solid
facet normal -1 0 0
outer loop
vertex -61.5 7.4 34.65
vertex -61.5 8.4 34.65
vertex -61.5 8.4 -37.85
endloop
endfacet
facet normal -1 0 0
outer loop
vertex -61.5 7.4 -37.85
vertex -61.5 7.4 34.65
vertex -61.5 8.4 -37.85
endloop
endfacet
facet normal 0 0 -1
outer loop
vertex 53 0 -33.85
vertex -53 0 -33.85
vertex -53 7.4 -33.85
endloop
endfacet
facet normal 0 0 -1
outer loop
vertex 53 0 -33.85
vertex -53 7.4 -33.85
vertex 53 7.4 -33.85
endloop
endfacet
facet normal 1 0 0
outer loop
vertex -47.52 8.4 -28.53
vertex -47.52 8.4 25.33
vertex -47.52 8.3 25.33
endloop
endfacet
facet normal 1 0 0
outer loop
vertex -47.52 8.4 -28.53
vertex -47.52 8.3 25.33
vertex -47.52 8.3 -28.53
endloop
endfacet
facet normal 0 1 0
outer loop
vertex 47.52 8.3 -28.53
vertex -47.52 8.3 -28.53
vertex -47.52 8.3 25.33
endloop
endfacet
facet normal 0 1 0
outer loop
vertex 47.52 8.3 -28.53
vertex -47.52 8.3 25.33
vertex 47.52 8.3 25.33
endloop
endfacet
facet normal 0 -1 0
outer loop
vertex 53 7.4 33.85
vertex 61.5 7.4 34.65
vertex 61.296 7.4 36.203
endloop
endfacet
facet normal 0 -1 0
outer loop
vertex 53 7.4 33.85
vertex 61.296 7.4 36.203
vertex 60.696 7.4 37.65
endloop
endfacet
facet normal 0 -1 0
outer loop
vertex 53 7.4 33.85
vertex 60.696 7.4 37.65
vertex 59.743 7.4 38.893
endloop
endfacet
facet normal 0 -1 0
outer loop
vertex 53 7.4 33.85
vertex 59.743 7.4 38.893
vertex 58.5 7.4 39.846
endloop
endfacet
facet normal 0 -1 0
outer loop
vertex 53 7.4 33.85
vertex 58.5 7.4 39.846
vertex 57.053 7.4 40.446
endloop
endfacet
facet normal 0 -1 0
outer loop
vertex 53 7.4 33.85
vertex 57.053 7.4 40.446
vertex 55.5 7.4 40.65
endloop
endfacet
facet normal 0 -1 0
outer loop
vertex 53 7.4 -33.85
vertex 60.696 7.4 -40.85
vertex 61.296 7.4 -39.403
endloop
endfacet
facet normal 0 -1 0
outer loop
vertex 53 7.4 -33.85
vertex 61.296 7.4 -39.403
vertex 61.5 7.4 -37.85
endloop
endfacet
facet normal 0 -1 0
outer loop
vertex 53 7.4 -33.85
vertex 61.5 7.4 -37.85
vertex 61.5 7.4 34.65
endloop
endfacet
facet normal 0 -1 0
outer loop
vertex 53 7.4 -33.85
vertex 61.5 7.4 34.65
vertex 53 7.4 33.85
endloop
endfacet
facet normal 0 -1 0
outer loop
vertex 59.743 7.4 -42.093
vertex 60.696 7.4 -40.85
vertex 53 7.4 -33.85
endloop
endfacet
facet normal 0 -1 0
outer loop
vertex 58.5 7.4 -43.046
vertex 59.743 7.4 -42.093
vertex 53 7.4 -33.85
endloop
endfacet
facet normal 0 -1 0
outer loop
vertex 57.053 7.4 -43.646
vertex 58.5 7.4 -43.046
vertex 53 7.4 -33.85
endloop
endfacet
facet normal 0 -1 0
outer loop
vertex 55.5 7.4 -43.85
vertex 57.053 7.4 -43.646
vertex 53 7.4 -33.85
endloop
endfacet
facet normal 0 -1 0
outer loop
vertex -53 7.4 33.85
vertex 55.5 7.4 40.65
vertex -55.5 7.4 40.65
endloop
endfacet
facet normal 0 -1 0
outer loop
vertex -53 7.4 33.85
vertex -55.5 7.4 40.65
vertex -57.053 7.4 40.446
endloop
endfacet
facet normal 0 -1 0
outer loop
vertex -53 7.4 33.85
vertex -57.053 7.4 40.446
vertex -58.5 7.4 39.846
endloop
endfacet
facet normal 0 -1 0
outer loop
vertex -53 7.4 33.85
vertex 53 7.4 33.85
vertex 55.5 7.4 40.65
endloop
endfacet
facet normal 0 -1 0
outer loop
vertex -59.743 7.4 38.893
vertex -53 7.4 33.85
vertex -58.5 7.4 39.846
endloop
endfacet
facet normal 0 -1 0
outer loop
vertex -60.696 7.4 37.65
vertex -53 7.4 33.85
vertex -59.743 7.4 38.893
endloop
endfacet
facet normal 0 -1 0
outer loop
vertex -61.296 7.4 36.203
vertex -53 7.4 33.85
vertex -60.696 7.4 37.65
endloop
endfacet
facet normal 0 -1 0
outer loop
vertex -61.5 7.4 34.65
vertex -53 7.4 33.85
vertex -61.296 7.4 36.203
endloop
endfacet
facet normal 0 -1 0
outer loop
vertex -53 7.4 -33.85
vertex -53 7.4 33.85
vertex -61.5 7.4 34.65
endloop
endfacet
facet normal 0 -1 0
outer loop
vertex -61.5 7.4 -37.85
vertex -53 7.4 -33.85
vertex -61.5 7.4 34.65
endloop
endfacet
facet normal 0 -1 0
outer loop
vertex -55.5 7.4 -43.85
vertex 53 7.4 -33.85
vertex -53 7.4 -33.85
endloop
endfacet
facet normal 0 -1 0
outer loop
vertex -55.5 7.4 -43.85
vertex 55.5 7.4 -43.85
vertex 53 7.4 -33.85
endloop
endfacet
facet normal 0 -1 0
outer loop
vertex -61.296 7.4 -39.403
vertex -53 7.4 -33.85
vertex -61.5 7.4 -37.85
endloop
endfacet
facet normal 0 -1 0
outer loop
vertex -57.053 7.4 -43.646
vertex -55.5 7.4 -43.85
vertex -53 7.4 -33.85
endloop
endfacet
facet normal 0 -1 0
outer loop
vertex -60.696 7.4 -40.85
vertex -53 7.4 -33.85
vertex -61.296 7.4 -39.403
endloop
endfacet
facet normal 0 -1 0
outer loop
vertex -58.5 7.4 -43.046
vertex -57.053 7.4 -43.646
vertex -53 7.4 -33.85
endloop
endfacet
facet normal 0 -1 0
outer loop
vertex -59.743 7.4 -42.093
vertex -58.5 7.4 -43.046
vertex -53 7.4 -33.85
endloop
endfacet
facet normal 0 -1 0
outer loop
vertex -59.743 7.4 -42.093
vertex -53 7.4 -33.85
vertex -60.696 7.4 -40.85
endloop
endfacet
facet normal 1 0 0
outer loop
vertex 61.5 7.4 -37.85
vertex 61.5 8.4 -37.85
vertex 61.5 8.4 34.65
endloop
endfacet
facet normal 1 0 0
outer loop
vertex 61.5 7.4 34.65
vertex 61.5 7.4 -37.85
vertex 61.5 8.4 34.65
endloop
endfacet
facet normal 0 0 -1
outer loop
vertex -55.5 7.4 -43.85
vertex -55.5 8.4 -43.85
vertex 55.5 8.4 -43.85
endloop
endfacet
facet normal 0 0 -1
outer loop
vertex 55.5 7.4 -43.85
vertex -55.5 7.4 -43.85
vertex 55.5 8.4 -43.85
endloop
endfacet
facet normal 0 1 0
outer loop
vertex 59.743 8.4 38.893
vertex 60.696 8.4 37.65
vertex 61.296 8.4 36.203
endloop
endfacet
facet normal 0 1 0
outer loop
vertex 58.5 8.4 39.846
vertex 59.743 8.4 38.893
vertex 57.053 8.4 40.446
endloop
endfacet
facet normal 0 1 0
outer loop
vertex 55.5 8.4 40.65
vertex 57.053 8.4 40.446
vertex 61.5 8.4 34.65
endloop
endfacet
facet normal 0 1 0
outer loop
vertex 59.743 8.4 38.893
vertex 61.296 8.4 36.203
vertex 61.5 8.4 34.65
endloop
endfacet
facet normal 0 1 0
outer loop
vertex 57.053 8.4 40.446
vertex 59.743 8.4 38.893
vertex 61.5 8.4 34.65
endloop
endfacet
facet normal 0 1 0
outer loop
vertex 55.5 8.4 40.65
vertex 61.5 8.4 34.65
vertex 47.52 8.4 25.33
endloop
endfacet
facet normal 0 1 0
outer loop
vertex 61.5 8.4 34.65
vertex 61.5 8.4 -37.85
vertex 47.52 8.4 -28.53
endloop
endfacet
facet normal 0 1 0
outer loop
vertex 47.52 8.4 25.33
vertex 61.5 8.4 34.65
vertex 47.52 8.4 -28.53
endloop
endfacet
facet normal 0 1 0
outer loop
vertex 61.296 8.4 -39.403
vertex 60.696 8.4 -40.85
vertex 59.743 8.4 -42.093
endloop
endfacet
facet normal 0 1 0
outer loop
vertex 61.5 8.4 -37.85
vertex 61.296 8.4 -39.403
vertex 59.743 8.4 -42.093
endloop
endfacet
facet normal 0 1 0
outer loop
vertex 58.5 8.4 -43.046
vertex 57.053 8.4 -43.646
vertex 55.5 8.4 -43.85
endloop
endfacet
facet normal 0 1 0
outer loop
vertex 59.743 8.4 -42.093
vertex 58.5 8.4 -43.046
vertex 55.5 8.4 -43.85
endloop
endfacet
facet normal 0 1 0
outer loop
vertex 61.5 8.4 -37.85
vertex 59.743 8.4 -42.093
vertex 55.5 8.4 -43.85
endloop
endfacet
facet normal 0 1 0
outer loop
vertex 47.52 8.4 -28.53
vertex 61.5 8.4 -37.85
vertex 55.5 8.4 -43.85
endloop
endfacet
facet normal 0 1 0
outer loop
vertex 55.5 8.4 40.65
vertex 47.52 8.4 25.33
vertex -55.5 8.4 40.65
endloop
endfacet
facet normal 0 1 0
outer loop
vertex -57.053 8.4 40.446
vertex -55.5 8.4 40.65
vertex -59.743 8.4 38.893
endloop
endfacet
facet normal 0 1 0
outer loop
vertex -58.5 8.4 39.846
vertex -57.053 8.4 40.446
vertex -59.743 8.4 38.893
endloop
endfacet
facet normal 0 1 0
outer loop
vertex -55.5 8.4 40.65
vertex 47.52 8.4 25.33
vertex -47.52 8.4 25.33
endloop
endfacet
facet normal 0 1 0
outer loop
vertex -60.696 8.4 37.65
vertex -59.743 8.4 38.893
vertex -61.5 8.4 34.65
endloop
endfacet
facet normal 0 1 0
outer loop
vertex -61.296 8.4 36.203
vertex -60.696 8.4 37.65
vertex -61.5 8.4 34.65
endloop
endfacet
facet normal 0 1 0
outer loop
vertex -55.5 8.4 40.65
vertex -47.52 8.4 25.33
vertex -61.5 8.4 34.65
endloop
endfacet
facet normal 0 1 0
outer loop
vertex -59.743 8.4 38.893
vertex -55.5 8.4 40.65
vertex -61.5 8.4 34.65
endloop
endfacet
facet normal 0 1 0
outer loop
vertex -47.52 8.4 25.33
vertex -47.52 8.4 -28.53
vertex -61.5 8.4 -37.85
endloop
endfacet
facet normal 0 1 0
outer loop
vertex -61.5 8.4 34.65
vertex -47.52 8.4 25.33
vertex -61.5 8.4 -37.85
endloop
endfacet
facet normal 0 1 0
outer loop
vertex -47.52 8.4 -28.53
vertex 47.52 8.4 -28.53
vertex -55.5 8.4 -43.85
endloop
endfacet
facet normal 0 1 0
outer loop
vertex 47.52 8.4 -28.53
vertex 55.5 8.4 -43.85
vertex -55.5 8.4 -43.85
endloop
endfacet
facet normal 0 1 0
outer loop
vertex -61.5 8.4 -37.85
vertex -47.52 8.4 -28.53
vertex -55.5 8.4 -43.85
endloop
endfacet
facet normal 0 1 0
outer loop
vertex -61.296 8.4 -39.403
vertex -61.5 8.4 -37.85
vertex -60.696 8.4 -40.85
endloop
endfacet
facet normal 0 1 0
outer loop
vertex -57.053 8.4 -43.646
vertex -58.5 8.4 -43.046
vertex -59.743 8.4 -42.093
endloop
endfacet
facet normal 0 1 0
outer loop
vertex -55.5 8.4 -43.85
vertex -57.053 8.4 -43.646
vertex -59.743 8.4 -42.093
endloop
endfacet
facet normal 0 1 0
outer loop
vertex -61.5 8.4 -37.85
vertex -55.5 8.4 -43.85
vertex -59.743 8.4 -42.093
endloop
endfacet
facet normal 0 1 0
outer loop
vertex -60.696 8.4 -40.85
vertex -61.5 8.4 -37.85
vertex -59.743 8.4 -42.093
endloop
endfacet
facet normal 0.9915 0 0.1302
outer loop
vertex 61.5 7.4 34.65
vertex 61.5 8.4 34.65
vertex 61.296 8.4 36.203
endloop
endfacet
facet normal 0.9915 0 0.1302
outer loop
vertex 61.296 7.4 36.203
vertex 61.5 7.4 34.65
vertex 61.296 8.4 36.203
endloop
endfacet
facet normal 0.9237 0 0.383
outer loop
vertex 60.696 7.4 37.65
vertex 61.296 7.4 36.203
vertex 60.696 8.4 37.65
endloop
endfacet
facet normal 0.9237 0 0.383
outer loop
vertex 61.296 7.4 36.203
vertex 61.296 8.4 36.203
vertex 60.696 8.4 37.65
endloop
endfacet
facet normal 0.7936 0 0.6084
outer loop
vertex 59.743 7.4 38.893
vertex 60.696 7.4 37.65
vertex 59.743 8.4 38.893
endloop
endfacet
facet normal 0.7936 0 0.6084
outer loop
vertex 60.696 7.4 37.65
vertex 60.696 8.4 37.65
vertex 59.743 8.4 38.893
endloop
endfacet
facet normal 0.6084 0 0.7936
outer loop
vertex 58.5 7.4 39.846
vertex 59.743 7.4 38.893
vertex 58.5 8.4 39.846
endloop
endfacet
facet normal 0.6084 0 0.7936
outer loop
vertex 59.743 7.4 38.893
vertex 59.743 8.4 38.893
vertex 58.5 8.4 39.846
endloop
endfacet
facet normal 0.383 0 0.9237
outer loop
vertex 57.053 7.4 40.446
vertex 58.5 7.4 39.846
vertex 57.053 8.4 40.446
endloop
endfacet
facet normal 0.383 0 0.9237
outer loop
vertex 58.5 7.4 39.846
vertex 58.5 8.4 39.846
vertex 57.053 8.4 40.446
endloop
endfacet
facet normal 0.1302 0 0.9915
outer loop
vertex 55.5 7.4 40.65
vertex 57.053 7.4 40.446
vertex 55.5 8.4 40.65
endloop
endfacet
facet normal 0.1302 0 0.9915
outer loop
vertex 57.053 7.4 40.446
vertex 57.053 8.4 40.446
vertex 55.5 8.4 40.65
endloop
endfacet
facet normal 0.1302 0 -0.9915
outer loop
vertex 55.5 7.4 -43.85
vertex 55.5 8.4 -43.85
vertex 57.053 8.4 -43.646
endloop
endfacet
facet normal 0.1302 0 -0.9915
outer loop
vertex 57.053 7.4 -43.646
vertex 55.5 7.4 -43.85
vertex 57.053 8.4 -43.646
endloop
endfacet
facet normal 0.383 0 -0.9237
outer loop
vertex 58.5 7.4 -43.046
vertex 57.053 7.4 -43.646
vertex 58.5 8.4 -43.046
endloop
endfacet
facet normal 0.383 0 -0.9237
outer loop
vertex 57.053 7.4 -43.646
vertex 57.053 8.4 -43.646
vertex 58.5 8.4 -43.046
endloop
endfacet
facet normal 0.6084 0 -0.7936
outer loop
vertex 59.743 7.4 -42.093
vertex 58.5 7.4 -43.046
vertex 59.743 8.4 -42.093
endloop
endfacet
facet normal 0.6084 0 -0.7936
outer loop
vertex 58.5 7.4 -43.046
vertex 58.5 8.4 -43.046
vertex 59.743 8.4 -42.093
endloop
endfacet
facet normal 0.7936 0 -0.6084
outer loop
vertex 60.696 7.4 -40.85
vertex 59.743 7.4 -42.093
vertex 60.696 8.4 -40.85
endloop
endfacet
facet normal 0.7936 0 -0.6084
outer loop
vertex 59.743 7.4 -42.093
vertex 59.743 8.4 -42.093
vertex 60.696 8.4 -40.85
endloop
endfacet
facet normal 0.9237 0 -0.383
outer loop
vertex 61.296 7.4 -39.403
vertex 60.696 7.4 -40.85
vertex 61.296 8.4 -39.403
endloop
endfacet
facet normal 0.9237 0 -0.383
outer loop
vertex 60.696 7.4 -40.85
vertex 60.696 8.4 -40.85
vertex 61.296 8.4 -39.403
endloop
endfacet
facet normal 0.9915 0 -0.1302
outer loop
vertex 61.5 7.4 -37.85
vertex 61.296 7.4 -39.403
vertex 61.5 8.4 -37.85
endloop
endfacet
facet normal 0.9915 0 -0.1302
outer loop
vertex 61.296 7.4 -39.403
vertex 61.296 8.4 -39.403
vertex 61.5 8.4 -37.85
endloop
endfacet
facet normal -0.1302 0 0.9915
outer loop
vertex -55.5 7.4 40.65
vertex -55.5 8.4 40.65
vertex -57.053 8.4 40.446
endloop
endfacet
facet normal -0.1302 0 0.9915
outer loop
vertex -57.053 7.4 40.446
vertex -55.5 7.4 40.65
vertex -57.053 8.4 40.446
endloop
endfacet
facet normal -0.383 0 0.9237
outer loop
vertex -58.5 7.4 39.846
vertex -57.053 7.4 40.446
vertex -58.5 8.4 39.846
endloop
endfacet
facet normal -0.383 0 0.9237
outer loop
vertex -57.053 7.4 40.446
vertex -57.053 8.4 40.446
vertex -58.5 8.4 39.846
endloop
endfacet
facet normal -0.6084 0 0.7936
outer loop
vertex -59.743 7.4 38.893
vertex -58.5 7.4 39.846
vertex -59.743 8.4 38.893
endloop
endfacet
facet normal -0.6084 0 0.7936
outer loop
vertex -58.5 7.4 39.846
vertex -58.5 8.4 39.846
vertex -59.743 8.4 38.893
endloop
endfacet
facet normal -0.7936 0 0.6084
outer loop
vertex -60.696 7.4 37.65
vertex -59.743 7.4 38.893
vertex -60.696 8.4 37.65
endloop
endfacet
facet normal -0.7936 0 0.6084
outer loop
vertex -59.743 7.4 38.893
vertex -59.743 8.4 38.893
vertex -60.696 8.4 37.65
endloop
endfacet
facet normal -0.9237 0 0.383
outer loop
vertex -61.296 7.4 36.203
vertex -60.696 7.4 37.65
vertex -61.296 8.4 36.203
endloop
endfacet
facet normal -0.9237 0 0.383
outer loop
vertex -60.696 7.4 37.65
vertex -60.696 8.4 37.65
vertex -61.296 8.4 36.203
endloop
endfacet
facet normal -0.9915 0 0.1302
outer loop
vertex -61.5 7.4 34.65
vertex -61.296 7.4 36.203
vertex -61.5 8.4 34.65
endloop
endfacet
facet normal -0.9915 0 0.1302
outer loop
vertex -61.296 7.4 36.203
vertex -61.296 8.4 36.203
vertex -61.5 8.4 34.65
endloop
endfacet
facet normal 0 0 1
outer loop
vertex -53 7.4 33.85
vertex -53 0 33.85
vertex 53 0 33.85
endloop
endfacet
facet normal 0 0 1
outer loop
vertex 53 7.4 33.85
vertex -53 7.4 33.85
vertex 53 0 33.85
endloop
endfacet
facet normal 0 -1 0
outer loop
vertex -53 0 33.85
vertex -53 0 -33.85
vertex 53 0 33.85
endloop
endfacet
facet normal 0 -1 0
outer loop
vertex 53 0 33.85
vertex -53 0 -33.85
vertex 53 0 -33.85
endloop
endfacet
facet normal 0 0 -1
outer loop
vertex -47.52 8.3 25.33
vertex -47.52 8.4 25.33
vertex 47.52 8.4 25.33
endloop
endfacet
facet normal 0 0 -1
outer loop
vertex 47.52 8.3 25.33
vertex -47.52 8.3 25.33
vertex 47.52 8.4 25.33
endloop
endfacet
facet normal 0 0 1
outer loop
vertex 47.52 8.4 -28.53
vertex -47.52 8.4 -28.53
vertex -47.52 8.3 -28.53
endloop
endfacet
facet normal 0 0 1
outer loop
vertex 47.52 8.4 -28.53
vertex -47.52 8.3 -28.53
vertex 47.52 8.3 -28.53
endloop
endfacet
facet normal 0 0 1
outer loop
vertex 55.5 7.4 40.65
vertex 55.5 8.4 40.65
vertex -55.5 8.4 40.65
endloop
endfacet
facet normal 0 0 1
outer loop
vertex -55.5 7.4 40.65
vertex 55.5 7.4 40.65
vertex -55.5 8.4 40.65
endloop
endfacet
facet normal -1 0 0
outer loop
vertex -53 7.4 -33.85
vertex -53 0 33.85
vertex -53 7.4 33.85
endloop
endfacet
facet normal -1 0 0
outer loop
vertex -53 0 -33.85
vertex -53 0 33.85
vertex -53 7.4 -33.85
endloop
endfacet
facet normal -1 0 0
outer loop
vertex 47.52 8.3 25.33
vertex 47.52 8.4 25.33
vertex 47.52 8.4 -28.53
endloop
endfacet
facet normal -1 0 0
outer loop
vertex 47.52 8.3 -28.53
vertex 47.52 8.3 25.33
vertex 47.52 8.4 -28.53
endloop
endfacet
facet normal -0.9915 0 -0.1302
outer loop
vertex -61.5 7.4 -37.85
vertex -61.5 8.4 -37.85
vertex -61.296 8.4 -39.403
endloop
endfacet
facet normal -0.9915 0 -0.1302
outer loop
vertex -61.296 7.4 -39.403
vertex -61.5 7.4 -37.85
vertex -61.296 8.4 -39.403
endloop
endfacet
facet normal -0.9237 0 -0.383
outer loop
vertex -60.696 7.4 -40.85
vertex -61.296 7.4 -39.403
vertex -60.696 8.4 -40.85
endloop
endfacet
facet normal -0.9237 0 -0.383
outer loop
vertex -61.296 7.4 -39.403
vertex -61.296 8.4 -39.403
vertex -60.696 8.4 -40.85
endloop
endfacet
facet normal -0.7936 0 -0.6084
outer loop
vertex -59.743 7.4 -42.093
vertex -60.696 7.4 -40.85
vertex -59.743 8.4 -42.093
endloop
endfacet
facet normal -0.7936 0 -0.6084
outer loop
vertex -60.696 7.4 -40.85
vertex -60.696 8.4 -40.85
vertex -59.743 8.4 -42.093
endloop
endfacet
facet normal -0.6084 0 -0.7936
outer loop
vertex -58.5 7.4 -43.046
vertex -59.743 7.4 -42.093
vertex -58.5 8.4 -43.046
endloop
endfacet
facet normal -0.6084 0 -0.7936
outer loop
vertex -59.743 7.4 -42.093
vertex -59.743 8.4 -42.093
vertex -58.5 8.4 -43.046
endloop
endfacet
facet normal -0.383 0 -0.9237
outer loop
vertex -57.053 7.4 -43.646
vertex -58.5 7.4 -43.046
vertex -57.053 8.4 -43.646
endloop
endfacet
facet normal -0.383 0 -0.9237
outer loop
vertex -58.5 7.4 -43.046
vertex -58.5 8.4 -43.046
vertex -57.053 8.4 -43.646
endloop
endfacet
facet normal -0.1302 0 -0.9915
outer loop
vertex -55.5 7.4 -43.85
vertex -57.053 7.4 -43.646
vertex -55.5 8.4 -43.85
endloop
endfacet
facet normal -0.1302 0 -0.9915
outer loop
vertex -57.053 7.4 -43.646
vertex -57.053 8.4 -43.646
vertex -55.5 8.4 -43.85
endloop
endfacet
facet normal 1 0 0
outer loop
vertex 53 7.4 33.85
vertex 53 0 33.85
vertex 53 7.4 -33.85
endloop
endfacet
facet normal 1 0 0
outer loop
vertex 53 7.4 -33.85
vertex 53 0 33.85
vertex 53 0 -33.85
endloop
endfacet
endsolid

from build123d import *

# Parameters (mm, degrees)
SKETCH2_W           = 106
SKETCH2_H           = 67.7
BOSS_EXTRUDE1_DEPTH = 8.4
BOSS_EXTRUDE2_DEPTH = 1
SKETCH5_W           = 95.04
SKETCH5_H           = 53.86
CUT_EXTRUDE1_DEPTH  = 0.1


with BuildPart() as part:
    # Sketch2 → Boss-Extrude1 (new body)
    with BuildSketch(Plane(origin=(0, 0, 0), x_dir=(1, 0, 0), z_dir=(0, 1, 0))):
        Rectangle(SKETCH2_W, SKETCH2_H)
    extrude(amount=BOSS_EXTRUDE1_DEPTH)

    # Sketch3 → Boss-Extrude2 (add)
    with BuildSketch(Plane(origin=(0, 8.4, 0), x_dir=(1, 0, 0), z_dir=(0, 1, 0))):
        with BuildLine():
            Line((-55.5, 43.85), (55.5, 43.85))
            ThreePointArc((55.5, 43.85), (59.742640687, 42.092640687), (61.5, 37.85))
            Line((61.5, 37.85), (61.5, -34.65))
            ThreePointArc((61.5, -34.65), (59.742640687, -38.892640687), (55.5, -40.65))
            Line((55.5, -40.65), (-55.5, -40.65))
            ThreePointArc((-55.5, -40.65), (-59.742640687, -38.892640687), (-61.5, -34.65))
            Line((-61.5, -34.65), (-61.5, 37.85))
            ThreePointArc((-61.5, 37.85), (-59.742640687, 42.092640687), (-55.5, 43.85))
        make_face()
    extrude(amount=-BOSS_EXTRUDE2_DEPTH)

    # Sketch5 → Cut-Extrude1 (cut)
    with BuildSketch(Plane(origin=(0, 8.4, 0), x_dir=(1, 0, 0), z_dir=(0, 1, 0))):
        with Locations((0, 1.6)):
            Rectangle(SKETCH5_W, SKETCH5_H)
    extrude(amount=-CUT_EXTRUDE1_DEPTH, mode=Mode.SUBTRACT)


solid = part.part
